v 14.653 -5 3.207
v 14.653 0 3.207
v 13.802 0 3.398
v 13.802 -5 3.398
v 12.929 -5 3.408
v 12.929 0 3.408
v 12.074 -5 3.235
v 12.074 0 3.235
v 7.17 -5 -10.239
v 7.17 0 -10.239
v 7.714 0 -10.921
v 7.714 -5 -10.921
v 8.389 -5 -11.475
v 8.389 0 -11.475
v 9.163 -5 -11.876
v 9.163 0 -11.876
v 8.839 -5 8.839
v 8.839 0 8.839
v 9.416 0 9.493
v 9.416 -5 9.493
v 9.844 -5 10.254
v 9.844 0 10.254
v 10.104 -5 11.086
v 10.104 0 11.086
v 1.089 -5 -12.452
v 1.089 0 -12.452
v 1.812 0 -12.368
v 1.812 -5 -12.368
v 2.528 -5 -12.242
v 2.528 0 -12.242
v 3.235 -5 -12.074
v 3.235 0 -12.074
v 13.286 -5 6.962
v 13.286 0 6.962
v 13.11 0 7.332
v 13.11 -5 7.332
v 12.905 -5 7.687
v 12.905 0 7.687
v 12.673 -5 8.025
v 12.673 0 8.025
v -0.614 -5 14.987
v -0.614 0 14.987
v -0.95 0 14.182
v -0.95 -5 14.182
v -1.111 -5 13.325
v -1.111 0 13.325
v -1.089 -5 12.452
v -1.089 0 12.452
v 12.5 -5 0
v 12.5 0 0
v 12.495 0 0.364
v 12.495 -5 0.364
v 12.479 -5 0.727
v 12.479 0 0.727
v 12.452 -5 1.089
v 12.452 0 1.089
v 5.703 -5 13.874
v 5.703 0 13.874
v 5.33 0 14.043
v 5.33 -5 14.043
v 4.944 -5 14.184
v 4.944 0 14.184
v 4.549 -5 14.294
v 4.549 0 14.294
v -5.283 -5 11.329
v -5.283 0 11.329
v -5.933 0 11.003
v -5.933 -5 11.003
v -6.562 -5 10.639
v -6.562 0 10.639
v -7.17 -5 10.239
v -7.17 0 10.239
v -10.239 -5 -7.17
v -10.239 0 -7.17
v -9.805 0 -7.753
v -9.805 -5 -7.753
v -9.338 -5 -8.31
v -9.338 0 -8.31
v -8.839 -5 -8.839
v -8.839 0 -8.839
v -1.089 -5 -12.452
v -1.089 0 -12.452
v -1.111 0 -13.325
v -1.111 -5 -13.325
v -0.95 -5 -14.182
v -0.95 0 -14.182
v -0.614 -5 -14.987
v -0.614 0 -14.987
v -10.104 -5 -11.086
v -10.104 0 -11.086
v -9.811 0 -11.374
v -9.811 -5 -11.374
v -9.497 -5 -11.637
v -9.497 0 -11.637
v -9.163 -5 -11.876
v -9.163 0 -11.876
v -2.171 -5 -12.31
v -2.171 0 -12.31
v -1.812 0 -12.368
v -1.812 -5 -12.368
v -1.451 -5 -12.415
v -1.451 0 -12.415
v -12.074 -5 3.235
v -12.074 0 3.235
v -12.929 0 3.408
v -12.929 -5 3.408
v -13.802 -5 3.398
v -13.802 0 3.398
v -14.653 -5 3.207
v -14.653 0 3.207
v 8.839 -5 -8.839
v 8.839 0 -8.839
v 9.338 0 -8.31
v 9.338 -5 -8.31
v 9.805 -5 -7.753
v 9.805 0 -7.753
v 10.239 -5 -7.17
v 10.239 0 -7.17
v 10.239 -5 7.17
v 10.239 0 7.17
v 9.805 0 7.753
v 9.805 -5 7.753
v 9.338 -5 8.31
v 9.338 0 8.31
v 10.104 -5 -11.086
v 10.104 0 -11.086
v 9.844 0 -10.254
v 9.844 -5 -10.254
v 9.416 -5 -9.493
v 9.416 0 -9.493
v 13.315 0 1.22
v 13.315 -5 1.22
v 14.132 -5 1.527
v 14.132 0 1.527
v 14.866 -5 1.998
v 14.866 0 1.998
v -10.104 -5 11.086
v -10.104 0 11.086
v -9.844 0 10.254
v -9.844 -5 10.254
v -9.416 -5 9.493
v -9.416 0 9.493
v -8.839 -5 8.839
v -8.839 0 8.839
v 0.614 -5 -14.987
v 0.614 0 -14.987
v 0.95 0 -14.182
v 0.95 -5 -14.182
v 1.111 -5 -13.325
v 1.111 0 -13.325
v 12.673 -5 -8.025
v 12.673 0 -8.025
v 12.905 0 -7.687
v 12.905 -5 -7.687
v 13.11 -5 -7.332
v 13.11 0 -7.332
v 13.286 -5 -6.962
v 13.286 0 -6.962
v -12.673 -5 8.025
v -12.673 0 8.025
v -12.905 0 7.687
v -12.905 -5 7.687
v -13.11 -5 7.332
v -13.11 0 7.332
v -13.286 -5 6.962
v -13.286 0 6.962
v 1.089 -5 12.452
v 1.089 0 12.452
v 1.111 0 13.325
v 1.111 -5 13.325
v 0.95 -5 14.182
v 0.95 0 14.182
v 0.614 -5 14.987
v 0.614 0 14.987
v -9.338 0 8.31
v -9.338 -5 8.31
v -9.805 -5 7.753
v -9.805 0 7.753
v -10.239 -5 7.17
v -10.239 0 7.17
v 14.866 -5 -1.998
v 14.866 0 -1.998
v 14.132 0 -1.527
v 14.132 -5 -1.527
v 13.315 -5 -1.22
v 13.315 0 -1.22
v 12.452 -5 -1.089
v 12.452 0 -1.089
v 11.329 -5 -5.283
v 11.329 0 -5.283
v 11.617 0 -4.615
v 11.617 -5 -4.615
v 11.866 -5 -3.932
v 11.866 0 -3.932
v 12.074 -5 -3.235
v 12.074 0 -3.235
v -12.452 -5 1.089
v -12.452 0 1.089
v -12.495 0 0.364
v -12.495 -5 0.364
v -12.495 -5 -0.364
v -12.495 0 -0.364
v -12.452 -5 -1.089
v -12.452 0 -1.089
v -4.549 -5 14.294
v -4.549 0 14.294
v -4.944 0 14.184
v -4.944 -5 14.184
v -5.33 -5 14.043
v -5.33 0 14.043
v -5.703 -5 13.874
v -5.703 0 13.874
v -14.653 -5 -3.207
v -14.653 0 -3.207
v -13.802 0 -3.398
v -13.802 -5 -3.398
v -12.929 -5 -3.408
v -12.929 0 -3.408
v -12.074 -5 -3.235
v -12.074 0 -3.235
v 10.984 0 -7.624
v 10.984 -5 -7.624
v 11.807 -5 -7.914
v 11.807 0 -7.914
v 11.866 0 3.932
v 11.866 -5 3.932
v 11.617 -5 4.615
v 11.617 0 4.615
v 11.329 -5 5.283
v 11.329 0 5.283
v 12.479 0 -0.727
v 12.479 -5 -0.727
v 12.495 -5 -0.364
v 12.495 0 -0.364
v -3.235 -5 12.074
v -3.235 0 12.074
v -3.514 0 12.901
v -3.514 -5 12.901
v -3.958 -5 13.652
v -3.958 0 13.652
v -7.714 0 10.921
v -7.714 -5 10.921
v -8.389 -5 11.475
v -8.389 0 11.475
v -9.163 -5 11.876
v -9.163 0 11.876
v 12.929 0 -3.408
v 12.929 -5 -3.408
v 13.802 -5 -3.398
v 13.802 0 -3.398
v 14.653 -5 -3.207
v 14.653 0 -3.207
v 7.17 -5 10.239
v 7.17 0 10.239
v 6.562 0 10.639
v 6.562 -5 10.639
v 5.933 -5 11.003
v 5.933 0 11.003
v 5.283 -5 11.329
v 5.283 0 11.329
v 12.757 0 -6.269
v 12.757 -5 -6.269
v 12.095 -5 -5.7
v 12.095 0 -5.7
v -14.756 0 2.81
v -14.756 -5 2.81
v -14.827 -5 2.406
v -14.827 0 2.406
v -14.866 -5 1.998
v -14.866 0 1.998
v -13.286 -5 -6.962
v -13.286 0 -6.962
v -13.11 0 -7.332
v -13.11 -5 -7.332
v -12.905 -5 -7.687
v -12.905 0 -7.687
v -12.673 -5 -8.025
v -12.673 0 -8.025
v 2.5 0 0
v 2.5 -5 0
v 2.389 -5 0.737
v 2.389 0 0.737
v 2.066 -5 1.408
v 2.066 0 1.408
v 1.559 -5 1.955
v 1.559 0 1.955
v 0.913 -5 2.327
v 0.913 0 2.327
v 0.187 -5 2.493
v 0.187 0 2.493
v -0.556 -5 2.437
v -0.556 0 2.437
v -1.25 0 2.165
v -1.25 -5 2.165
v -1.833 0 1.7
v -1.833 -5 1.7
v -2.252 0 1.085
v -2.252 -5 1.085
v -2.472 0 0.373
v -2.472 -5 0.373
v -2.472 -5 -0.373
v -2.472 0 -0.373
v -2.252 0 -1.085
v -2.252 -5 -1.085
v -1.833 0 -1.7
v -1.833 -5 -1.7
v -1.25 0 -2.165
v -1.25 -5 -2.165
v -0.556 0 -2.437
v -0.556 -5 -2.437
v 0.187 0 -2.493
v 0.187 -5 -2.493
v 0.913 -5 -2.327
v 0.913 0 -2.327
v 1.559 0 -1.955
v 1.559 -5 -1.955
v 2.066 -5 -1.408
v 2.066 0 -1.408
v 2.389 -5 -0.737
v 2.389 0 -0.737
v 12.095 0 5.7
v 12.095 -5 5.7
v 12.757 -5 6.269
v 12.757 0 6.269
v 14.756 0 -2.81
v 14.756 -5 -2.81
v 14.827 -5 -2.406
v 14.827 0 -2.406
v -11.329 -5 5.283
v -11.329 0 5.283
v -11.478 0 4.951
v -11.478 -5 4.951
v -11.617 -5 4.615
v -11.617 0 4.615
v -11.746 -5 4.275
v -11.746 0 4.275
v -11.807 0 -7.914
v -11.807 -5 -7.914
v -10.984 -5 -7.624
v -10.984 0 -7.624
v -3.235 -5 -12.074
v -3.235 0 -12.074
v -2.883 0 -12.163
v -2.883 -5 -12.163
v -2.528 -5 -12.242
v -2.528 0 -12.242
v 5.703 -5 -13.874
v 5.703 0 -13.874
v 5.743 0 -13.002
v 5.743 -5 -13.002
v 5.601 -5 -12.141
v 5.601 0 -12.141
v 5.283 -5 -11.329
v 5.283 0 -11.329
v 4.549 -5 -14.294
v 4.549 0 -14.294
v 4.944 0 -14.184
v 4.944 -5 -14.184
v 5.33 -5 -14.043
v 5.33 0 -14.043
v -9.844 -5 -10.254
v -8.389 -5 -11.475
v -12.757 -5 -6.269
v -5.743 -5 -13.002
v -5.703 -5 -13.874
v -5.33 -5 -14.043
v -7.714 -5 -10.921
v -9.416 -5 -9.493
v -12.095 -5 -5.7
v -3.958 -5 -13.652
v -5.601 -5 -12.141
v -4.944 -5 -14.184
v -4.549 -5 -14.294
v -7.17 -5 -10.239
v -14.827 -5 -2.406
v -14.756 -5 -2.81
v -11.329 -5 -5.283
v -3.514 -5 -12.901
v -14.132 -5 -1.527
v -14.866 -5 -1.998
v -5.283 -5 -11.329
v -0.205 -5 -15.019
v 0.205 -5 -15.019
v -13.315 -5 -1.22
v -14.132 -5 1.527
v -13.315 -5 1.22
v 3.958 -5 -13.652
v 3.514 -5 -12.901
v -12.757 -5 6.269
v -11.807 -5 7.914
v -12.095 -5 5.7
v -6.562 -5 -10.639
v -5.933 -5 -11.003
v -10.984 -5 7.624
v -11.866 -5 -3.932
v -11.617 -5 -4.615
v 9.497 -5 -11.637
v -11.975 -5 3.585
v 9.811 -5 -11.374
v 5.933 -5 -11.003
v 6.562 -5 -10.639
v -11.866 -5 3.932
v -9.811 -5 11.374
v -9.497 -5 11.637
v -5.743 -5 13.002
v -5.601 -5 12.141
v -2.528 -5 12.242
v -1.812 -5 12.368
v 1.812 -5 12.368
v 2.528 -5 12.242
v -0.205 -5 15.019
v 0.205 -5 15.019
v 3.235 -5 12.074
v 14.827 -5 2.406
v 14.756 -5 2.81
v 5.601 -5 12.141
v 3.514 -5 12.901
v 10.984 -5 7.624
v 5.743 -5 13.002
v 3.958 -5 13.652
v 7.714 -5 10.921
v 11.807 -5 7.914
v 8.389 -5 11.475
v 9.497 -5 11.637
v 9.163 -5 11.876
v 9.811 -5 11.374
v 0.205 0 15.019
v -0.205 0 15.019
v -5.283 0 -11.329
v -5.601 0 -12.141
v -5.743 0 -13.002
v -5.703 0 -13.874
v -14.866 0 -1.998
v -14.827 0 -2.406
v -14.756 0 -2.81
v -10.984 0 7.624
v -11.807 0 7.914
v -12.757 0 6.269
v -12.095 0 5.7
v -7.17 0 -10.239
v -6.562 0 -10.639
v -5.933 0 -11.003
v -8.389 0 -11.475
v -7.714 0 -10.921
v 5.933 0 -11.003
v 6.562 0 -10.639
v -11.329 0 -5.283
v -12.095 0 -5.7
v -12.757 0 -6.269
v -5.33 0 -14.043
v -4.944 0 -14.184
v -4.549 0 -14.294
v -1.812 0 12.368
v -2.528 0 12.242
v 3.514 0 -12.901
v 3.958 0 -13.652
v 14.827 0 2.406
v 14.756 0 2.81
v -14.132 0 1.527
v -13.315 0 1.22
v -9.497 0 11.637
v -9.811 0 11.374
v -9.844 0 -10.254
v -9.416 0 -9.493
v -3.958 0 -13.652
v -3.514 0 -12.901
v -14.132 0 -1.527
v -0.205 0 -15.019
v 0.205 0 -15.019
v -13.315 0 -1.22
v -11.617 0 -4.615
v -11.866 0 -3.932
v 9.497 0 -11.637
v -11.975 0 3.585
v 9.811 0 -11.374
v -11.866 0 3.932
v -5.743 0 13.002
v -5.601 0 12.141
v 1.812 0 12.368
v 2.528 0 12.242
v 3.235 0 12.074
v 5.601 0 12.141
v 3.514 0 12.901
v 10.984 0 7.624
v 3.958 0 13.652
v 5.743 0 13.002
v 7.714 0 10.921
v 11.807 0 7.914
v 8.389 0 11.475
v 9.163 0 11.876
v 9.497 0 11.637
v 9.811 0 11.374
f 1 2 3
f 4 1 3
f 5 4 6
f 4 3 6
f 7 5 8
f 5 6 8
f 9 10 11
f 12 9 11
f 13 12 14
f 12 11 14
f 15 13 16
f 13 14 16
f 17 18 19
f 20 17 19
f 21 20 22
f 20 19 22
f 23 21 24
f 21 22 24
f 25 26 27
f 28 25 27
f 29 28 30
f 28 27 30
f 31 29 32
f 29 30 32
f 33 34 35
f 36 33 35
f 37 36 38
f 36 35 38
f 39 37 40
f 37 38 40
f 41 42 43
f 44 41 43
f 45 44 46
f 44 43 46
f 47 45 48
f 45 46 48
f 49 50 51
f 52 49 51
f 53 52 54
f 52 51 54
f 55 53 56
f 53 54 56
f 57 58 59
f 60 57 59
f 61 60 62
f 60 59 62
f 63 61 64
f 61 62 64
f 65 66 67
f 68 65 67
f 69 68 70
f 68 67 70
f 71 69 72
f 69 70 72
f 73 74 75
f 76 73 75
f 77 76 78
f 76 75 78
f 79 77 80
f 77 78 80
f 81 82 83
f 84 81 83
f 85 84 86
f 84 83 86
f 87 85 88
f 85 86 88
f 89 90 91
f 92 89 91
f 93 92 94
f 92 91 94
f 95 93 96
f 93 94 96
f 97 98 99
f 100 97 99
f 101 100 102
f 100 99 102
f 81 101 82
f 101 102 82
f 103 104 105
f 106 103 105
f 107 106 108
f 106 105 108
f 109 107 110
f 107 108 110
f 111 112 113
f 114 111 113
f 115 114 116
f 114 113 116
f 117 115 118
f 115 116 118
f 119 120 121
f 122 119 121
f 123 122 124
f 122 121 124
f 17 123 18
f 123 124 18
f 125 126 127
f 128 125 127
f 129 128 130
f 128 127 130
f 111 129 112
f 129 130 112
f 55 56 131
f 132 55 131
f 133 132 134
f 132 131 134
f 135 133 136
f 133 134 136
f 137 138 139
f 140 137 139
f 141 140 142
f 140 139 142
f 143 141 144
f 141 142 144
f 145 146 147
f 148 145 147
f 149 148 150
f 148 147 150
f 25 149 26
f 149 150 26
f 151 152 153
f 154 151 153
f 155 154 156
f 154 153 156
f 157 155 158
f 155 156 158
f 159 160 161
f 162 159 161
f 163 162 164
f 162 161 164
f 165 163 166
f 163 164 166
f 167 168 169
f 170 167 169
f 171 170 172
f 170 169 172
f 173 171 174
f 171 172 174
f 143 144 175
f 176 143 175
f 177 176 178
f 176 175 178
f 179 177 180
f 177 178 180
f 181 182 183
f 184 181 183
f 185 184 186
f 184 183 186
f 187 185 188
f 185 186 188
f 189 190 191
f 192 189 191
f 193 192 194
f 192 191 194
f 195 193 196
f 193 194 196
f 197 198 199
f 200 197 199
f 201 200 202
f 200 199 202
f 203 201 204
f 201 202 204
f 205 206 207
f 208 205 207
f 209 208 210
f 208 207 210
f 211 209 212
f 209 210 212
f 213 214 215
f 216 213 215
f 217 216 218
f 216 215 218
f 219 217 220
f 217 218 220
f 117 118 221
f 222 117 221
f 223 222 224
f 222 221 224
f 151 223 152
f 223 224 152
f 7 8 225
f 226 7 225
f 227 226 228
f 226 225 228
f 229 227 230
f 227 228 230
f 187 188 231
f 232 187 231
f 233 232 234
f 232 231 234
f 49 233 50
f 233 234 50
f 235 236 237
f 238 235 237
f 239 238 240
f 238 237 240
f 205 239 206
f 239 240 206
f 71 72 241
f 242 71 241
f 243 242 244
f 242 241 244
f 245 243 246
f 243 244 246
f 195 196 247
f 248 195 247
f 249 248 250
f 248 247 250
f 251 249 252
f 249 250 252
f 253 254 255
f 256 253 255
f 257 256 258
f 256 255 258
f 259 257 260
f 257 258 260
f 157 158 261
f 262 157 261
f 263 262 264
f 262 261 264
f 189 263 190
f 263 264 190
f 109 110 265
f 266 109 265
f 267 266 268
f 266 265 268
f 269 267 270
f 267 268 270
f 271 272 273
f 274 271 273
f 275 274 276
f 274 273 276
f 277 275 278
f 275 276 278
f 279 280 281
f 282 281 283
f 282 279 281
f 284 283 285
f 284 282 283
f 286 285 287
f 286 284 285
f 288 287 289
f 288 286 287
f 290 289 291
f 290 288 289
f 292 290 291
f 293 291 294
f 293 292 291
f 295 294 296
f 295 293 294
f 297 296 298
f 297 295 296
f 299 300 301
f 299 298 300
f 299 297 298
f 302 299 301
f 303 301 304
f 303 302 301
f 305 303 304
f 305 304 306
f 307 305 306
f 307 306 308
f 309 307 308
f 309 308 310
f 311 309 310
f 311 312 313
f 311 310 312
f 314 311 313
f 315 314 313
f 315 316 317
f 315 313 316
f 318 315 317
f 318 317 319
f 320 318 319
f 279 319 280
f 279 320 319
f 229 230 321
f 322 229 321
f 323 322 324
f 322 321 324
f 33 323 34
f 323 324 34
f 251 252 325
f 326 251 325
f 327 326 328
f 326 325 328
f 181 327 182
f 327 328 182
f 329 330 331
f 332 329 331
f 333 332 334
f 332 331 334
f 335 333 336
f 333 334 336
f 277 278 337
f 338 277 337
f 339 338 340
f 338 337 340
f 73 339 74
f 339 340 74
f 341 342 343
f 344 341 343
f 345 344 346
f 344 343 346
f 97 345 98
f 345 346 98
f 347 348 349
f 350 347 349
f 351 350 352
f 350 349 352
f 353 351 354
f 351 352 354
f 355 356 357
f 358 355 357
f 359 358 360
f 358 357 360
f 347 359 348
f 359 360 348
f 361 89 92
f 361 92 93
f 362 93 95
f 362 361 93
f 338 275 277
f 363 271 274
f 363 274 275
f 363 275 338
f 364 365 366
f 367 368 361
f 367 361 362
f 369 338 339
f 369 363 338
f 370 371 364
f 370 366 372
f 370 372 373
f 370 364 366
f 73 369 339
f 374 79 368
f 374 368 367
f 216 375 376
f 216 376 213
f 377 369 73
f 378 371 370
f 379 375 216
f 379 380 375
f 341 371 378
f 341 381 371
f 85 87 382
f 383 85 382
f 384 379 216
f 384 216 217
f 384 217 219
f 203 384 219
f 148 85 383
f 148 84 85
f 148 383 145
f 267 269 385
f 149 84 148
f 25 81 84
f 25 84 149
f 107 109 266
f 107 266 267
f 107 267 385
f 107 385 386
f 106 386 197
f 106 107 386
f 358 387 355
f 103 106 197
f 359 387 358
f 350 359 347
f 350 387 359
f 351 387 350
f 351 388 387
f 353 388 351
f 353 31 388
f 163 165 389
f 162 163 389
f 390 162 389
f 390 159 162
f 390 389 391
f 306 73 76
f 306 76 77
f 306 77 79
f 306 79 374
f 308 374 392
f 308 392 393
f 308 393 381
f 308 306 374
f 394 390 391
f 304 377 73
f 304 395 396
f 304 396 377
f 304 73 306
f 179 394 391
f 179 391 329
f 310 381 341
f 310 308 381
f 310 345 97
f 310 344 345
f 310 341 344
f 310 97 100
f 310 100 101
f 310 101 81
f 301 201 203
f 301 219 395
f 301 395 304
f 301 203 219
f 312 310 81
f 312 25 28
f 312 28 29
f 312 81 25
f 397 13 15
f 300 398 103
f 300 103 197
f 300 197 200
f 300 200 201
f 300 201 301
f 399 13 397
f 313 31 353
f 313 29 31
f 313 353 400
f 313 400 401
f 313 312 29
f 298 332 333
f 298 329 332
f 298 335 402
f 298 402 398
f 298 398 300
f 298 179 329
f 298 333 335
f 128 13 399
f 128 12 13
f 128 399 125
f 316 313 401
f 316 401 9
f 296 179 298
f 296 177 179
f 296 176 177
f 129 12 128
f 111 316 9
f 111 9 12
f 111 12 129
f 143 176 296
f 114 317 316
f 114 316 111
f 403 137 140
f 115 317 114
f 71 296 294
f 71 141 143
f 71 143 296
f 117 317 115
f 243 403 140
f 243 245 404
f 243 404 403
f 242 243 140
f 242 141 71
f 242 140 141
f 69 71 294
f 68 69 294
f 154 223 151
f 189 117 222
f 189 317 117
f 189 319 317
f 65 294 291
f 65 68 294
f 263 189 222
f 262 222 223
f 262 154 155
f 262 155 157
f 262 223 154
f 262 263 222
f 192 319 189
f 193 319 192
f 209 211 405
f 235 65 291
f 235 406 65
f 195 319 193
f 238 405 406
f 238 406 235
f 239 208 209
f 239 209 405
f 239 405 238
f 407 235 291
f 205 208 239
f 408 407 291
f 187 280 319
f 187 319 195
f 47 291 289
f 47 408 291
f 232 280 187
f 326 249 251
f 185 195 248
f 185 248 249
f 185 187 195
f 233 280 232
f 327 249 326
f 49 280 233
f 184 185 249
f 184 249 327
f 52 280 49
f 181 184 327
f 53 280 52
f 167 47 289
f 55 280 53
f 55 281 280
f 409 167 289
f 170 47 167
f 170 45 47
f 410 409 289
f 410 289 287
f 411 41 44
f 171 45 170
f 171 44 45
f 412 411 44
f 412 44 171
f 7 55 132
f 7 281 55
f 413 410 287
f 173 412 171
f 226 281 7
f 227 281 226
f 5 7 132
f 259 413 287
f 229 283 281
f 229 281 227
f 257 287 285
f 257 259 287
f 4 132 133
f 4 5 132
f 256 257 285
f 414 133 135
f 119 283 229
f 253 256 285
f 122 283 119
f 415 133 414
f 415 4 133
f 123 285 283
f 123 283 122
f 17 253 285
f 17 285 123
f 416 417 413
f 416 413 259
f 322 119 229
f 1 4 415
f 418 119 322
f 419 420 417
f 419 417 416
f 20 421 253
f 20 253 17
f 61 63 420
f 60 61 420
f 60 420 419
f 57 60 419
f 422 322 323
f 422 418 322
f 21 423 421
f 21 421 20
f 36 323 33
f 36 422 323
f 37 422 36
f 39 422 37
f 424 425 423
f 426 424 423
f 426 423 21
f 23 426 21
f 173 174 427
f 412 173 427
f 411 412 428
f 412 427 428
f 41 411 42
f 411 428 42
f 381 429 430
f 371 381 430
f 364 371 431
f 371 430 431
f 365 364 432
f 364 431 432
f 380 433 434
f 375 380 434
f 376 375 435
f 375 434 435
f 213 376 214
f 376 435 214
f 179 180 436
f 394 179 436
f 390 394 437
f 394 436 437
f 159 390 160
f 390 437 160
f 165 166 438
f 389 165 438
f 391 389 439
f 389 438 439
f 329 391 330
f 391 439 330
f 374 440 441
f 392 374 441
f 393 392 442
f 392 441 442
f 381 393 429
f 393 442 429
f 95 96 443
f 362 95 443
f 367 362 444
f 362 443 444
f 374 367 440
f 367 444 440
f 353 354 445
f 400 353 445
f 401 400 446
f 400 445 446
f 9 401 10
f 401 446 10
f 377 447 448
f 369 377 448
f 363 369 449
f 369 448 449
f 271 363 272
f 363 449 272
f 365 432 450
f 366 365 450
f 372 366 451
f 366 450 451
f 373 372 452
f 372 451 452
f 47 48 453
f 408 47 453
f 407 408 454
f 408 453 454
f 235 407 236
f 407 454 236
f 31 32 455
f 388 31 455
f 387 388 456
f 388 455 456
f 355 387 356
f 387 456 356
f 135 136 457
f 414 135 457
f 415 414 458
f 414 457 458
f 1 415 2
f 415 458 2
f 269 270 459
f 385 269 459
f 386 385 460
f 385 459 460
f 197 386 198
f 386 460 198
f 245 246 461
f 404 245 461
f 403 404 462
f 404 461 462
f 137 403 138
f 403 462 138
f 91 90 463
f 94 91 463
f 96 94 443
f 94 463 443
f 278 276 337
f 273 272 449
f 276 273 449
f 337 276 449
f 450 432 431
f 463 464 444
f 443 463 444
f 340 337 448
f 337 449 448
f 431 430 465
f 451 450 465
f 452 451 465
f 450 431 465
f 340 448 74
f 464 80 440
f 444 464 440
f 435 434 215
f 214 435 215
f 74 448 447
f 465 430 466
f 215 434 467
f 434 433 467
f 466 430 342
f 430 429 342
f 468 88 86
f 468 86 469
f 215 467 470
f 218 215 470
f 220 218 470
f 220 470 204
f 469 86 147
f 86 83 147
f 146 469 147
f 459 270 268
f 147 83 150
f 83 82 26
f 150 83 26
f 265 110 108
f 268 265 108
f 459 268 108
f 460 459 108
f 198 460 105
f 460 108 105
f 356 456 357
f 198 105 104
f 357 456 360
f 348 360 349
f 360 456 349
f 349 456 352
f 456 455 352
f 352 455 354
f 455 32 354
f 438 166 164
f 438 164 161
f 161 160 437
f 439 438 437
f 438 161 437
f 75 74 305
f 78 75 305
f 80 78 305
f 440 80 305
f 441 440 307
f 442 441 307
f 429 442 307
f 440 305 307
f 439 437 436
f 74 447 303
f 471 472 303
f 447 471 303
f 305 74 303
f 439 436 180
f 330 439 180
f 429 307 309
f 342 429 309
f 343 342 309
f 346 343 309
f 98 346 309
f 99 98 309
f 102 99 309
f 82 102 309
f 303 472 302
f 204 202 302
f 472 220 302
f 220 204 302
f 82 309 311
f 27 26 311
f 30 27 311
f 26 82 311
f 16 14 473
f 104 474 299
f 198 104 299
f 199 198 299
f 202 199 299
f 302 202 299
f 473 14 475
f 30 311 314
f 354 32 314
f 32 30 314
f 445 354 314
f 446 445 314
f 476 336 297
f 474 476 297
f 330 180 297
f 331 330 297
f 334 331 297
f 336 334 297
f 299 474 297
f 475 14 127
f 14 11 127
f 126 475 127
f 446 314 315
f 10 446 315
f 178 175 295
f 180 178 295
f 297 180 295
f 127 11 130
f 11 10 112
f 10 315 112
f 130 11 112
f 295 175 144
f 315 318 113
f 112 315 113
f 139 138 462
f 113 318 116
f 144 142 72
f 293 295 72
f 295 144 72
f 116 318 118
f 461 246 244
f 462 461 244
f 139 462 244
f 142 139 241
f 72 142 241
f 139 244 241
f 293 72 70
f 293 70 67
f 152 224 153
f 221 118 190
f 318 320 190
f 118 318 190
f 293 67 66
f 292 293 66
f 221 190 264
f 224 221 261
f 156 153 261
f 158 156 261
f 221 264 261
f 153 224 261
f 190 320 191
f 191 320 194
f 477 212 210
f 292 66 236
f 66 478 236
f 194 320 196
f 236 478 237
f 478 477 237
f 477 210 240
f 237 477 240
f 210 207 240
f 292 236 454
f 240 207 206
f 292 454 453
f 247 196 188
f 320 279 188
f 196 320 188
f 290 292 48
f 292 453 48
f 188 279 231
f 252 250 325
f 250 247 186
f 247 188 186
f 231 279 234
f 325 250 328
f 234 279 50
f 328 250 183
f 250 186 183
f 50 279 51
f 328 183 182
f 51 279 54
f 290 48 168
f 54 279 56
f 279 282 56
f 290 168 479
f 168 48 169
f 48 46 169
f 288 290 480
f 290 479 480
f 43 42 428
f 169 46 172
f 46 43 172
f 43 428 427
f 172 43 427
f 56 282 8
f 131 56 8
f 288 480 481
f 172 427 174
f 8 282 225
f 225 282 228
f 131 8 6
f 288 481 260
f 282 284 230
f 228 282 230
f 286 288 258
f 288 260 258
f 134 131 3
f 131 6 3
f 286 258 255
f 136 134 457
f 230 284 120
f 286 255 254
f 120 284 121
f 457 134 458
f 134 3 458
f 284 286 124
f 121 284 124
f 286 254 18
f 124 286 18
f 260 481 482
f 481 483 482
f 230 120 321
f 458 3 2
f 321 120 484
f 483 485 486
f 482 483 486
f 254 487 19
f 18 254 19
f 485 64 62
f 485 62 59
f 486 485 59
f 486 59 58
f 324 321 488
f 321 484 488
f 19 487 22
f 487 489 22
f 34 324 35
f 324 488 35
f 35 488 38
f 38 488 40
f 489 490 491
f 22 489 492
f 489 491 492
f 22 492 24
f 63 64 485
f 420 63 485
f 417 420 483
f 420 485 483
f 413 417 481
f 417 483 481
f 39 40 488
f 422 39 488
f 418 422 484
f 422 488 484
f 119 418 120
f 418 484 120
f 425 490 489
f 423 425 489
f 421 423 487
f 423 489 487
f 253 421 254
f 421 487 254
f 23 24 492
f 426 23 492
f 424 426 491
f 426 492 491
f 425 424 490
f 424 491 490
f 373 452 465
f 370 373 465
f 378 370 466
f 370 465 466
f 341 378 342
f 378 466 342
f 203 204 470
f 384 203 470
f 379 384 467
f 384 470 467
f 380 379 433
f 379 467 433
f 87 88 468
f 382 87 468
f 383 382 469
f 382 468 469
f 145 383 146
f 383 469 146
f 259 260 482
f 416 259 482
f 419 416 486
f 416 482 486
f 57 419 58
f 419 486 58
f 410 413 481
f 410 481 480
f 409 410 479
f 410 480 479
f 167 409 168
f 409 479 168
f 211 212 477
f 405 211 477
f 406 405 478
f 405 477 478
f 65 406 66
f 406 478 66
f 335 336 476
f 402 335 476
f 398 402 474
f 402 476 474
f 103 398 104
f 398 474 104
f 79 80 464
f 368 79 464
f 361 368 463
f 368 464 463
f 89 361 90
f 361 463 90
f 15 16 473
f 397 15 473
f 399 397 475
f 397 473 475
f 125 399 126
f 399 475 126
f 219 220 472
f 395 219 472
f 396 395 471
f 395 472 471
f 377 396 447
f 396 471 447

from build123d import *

# Parameters (mm, degrees)
F0_R     = 2.5
F1_DEPTH = 5
F2_COUNT = 18


with BuildPart() as f1:
    # F0 (on Front) → F1 (new body)
    with BuildSketch(Plane.XZ):
        with BuildLine():
            ThreePointArc((-1.0894467843, 12.4524337261), (-8.4448775952, -9.2159667101), (12.5, 0))
            ThreePointArc((12.5, 0), (9.2159667101, 8.4448775952), (1.0894467843, 12.4524337261))
            ThreePointArc((1.0894467843, 12.4524337261), (0, 12.5), (-1.0894467843, 12.4524337261))
        make_face()
        Circle(F0_R, mode=Mode.SUBTRACT)
        with BuildLine():
            ThreePointArc((-1.0894467843, 12.4524337261), (0, 12.5), (1.0894467843, 12.4524337261))
            ThreePointArc((1.0894467843, 12.4524337261), (1.0527842675, 13.7576625834), (0.6138861357, 14.9874328626))
            ThreePointArc((0.6138861357, 14.9874328626), (0, 15.0232996939), (-0.6138861357, 14.9874328626))
            ThreePointArc((-0.6138861357, 14.9874328626), (-1.0527842675, 13.7576625834), (-1.0894467843, 12.4524337261))
        make_face()
    extrude(amount=F1_DEPTH)

    # F2: F1 ×18 about axis
    f2_axis = Axis((0, 0, 0), (0, 1, 0))


with BuildPart() as f1_1:
    add(f1.part)
    for i in range(1, F2_COUNT):
        add(f1.part.rotate(f2_axis, i * 360 / F2_COUNT))


solid = f1_1.part
